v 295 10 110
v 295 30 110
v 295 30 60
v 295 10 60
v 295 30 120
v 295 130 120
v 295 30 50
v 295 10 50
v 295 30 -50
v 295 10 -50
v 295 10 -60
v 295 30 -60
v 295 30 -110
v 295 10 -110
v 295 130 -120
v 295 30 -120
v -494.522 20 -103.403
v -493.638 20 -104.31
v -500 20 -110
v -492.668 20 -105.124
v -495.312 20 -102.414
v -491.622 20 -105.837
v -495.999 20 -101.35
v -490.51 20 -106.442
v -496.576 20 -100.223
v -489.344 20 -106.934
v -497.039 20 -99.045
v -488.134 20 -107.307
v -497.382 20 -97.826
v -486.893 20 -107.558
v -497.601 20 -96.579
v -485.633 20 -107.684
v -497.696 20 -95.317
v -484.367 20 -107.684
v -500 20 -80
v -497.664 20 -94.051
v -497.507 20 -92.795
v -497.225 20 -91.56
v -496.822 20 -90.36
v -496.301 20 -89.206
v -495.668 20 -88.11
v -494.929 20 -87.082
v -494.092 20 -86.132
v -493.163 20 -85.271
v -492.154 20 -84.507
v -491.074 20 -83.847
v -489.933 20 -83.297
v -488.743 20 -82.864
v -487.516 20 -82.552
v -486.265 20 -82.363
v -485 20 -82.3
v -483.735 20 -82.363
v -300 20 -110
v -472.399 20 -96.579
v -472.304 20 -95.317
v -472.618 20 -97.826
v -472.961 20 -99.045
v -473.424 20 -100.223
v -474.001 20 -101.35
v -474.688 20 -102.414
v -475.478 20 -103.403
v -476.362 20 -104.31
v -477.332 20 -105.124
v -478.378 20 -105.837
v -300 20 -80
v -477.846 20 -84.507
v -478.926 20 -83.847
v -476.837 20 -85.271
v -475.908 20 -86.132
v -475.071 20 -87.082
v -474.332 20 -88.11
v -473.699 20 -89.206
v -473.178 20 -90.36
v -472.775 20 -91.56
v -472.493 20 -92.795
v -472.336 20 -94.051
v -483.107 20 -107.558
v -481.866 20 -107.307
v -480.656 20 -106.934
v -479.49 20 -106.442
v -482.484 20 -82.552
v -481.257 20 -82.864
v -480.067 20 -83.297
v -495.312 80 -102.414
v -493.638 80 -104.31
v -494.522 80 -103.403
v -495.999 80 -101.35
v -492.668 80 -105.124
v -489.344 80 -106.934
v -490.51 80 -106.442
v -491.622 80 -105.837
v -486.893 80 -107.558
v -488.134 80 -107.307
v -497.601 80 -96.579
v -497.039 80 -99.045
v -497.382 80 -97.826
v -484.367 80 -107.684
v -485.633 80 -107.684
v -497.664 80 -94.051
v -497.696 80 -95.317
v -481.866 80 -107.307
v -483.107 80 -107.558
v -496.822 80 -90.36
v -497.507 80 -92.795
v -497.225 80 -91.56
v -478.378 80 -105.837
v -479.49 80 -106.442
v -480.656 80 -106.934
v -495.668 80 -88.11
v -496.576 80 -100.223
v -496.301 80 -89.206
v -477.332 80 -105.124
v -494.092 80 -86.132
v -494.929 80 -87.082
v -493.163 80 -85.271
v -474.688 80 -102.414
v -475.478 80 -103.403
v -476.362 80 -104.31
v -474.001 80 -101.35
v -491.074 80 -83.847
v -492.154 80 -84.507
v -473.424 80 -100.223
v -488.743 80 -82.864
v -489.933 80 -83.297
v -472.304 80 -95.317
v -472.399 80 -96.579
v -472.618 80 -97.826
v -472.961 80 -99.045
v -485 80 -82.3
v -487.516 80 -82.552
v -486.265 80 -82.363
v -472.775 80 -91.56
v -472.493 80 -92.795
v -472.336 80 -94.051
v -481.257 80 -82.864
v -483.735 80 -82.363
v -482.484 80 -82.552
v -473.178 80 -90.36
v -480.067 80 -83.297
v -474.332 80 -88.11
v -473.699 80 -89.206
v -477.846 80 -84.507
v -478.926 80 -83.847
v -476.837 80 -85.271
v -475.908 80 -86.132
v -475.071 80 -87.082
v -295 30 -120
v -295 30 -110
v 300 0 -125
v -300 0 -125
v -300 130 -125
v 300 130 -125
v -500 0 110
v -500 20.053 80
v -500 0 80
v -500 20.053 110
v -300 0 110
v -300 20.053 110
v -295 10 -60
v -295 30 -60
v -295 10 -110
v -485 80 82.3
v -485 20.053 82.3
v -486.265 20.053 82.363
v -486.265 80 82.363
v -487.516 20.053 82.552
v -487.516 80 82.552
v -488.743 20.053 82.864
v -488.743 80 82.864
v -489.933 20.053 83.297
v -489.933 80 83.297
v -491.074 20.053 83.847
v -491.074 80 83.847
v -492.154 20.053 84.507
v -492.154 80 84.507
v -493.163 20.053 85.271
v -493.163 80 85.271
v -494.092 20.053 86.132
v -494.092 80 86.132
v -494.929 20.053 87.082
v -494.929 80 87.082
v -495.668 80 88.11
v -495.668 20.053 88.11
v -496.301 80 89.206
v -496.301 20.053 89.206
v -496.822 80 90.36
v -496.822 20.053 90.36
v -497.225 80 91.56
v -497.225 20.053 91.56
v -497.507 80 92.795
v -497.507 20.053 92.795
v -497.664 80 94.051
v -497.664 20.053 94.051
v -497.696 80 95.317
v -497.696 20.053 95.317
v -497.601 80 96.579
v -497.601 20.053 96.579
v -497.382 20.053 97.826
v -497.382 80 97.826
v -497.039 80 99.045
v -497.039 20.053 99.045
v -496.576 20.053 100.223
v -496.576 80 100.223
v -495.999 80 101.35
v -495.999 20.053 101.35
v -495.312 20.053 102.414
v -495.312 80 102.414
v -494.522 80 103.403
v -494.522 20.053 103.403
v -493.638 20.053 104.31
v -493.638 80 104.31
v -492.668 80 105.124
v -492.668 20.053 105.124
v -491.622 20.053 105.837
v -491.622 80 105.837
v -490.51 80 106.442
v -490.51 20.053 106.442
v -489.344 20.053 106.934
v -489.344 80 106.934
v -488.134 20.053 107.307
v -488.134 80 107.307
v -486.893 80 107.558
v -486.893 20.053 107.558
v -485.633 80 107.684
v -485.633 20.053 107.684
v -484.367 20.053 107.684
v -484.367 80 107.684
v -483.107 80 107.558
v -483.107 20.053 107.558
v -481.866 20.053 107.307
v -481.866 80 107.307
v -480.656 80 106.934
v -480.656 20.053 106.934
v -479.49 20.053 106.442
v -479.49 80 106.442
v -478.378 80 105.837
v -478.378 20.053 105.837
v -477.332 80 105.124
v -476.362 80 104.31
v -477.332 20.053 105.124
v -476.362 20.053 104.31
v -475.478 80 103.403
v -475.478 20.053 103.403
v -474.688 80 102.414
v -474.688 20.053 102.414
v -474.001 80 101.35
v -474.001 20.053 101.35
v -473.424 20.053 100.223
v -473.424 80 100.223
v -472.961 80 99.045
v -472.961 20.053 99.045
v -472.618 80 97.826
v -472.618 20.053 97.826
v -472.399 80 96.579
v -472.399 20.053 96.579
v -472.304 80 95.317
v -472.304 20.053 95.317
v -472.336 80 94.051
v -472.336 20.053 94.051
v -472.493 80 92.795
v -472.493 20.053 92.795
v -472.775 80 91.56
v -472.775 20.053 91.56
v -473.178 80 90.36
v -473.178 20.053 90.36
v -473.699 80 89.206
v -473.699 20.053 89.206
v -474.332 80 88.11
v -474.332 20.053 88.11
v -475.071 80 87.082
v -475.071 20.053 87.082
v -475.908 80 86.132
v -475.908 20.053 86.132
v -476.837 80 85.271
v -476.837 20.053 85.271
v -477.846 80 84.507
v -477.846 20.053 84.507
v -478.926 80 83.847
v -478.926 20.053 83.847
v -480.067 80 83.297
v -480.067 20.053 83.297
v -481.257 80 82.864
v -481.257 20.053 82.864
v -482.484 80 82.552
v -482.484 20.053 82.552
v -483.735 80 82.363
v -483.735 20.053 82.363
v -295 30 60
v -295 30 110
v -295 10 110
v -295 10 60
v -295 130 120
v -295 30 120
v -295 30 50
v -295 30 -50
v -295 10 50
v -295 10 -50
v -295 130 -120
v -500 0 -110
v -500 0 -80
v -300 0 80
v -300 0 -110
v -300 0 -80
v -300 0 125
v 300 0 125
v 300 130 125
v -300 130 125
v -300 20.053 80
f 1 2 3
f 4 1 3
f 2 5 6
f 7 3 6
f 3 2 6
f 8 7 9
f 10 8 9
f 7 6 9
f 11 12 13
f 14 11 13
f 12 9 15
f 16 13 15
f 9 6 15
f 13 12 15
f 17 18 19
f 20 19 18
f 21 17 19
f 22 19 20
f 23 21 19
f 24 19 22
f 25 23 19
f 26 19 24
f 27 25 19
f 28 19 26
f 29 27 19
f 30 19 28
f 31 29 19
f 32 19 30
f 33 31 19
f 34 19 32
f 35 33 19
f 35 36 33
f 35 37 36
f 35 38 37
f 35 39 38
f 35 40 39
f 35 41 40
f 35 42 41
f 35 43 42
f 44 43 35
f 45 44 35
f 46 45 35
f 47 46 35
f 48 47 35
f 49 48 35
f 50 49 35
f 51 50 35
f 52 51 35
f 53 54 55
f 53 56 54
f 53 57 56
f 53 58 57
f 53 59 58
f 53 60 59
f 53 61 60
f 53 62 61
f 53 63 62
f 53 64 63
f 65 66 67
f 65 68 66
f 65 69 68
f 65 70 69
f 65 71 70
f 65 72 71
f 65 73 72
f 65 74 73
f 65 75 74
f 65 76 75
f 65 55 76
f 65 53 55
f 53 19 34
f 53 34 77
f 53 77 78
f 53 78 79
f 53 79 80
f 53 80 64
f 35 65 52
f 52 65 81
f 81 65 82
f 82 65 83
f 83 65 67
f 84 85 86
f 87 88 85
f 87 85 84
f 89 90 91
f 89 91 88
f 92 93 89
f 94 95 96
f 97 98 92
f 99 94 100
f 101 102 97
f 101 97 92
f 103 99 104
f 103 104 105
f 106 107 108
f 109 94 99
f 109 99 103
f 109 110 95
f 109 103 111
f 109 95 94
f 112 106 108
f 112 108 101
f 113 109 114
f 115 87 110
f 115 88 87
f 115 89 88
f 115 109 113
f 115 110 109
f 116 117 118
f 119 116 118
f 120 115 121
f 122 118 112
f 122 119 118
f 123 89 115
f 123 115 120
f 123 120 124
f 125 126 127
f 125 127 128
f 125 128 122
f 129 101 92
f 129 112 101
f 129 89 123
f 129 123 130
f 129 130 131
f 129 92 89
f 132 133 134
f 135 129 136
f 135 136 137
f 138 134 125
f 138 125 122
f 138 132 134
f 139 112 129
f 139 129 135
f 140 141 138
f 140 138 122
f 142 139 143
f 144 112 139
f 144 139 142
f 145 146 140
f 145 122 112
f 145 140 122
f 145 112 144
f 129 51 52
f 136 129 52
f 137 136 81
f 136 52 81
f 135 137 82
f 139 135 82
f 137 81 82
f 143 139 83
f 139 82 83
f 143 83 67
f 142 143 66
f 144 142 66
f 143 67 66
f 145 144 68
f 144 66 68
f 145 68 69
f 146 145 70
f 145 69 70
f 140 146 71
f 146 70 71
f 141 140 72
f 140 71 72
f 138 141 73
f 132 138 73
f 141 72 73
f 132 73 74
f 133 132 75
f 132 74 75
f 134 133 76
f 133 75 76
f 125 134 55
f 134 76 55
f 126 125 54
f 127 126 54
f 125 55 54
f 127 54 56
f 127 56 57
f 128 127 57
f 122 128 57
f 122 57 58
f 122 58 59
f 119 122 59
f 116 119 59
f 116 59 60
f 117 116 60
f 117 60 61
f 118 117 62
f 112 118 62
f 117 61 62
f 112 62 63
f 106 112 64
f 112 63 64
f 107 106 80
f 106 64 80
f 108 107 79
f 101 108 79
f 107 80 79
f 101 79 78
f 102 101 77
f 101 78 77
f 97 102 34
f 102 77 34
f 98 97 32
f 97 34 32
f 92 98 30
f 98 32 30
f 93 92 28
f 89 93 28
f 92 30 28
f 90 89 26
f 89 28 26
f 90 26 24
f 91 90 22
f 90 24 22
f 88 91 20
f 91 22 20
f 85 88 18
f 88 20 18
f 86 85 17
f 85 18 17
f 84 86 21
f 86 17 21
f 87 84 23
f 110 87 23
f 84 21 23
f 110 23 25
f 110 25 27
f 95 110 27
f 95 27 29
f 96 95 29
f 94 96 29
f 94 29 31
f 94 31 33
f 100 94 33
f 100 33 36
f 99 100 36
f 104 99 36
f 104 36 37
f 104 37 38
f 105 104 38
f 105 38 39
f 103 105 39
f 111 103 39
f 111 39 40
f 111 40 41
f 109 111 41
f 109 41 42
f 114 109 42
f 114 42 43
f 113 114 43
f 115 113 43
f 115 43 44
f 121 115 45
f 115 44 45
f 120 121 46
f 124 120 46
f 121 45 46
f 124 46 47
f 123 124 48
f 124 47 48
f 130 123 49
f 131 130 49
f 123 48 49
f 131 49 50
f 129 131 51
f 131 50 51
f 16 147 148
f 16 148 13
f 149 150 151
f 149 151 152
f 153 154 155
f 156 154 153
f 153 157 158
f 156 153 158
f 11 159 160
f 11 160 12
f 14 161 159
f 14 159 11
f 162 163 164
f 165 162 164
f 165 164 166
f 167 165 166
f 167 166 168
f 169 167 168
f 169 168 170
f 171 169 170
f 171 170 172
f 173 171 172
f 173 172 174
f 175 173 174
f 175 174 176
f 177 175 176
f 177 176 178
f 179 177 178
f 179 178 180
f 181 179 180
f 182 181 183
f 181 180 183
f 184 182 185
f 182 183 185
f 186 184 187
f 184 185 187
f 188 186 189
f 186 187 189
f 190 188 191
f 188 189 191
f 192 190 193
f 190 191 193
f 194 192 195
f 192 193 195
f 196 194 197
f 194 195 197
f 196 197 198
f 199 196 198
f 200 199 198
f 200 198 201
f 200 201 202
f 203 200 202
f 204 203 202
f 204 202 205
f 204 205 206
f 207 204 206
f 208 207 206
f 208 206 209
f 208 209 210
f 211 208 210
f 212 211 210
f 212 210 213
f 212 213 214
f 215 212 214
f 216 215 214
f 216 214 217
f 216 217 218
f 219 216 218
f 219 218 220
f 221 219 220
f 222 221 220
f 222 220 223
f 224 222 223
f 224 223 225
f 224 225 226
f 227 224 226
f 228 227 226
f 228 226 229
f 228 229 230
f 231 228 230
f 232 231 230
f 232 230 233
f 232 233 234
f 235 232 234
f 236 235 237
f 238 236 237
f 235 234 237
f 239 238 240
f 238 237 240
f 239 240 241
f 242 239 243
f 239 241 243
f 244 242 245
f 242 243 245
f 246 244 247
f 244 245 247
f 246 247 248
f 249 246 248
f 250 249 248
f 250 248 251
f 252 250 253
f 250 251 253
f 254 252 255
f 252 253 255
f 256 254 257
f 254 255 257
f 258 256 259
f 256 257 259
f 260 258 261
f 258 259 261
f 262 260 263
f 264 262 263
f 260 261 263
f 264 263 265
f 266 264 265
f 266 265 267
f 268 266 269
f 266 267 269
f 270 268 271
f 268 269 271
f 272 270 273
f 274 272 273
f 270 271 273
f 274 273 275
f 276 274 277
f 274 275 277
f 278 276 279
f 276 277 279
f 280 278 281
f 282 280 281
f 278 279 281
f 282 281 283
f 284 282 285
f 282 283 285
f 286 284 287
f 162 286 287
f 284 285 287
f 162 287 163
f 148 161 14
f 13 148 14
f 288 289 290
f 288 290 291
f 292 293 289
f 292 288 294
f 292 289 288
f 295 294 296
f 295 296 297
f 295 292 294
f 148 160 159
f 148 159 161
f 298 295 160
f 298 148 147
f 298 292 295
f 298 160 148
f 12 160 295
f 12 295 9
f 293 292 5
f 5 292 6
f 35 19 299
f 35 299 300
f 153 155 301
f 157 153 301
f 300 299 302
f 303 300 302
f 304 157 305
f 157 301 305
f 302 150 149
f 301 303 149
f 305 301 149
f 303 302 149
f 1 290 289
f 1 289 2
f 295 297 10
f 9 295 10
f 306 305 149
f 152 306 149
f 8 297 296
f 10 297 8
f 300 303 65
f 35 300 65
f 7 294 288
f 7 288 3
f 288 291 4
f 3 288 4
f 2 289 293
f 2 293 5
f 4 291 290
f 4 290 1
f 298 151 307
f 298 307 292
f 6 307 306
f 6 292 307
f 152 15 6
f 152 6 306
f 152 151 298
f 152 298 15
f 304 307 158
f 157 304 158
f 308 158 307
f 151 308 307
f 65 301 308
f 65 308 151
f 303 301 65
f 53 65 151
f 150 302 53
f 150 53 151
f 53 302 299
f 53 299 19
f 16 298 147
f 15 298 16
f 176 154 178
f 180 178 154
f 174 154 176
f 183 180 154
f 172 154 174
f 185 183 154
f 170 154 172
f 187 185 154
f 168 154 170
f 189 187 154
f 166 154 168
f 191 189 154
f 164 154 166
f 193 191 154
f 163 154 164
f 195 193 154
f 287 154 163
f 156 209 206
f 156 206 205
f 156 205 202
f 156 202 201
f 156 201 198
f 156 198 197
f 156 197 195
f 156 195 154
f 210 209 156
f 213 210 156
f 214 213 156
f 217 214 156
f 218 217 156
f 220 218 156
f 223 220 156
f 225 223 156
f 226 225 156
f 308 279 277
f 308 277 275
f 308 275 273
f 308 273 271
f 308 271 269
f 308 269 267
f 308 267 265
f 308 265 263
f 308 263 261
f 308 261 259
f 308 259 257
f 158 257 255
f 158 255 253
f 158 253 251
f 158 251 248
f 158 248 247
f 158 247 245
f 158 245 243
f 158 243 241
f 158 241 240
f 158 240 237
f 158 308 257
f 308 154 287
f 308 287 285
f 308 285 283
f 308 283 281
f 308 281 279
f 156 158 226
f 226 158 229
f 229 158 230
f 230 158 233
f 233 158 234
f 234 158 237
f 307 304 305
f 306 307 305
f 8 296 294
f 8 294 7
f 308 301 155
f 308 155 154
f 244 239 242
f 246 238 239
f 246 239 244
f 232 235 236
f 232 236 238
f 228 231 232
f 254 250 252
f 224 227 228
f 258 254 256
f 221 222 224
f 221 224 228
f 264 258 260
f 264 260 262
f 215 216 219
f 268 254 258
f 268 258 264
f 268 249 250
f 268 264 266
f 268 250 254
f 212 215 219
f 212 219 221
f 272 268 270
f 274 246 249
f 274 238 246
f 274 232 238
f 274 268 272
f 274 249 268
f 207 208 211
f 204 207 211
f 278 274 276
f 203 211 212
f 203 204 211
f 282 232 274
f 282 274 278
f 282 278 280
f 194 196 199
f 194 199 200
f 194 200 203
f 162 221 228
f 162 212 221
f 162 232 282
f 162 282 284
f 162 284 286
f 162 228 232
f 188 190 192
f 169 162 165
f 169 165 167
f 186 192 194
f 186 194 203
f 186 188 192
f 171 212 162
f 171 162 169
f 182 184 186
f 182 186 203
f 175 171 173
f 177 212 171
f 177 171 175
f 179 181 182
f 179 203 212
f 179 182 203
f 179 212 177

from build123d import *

# Parameters (mm, degrees)
SKETCH1_W           = 600
SKETCH1_H           = 250
BOSS_EXTRUDE1_DEPTH = 130
SKETCH2_W           = 590
SKETCH2_H           = 240
CUT_EXTRUDE1_DEPTH  = 120
SKETCH3_W           = 590
SKETCH3_H           = 10
BOSS_EXTRUDE2_DEPTH = 20
SKETCH4_W           = 30
SKETCH4_H           = 20
SKETCH4_H_2         = 20.05334452
BOSS_EXTRUDE3_DEPTH = 200
SKETCH5_R           = 12.7
BOSS_EXTRUDE4_DEPTH = 60


with BuildPart() as part:
    # Sketch1 → Boss-Extrude1 (new body)
    with BuildSketch(Plane(origin=(0, 0, 0), x_dir=(1, 0, 0), z_dir=(0, 1, 0))):
        Rectangle(SKETCH1_W, SKETCH1_H)
    extrude(amount=BOSS_EXTRUDE1_DEPTH)

    # Sketch2 → Cut-Extrude1 (cut)
    with BuildSketch(Plane(origin=(0, 130, 0), x_dir=(1, 0, 0), z_dir=(0, 1, 0))):
        Rectangle(SKETCH2_W, SKETCH2_H)
    extrude(amount=-CUT_EXTRUDE1_DEPTH, mode=Mode.SUBTRACT)

    # Sketch3 → Boss-Extrude2 (add)
    with BuildSketch(Plane(origin=(0, 10, 0), x_dir=(1, 0, 0), z_dir=(0, 1, 0))):
        with Locations((0, -115)):
            Rectangle(SKETCH3_W, SKETCH3_H)
        with Locations((0, -55)):
            Rectangle(SKETCH3_W, SKETCH3_H)
        with Locations((0, 55)):
            Rectangle(SKETCH3_W, SKETCH3_H)
        with Locations((0, 115)):
            Rectangle(SKETCH3_W, SKETCH3_H)
    extrude(amount=BOSS_EXTRUDE2_DEPTH)

    # Sketch4 → Boss-Extrude3 (add)
    with BuildSketch(Plane.ZY.offset(300)):
        with Locations((-95, 10)):
            Rectangle(SKETCH4_W, SKETCH4_H)
        with Locations((95, 10.02667226)):
            Rectangle(SKETCH4_W, SKETCH4_H_2)
    extrude(amount=BOSS_EXTRUDE3_DEPTH)

    # Sketch5 → Boss-Extrude4 (add)
    with BuildSketch(Plane(origin=(0, 20, 0), x_dir=(1, 0, 0), z_dir=(0, 1, 0))):
        with Locations(Location((-485, -95, 0), (0, 0, 90))):
            Circle(SKETCH5_R)
        with Locations(Location((-485, 95, 0), (0, 0, 270))):
            Circle(SKETCH5_R)
    extrude(amount=BOSS_EXTRUDE4_DEPTH)


solid = part.part
